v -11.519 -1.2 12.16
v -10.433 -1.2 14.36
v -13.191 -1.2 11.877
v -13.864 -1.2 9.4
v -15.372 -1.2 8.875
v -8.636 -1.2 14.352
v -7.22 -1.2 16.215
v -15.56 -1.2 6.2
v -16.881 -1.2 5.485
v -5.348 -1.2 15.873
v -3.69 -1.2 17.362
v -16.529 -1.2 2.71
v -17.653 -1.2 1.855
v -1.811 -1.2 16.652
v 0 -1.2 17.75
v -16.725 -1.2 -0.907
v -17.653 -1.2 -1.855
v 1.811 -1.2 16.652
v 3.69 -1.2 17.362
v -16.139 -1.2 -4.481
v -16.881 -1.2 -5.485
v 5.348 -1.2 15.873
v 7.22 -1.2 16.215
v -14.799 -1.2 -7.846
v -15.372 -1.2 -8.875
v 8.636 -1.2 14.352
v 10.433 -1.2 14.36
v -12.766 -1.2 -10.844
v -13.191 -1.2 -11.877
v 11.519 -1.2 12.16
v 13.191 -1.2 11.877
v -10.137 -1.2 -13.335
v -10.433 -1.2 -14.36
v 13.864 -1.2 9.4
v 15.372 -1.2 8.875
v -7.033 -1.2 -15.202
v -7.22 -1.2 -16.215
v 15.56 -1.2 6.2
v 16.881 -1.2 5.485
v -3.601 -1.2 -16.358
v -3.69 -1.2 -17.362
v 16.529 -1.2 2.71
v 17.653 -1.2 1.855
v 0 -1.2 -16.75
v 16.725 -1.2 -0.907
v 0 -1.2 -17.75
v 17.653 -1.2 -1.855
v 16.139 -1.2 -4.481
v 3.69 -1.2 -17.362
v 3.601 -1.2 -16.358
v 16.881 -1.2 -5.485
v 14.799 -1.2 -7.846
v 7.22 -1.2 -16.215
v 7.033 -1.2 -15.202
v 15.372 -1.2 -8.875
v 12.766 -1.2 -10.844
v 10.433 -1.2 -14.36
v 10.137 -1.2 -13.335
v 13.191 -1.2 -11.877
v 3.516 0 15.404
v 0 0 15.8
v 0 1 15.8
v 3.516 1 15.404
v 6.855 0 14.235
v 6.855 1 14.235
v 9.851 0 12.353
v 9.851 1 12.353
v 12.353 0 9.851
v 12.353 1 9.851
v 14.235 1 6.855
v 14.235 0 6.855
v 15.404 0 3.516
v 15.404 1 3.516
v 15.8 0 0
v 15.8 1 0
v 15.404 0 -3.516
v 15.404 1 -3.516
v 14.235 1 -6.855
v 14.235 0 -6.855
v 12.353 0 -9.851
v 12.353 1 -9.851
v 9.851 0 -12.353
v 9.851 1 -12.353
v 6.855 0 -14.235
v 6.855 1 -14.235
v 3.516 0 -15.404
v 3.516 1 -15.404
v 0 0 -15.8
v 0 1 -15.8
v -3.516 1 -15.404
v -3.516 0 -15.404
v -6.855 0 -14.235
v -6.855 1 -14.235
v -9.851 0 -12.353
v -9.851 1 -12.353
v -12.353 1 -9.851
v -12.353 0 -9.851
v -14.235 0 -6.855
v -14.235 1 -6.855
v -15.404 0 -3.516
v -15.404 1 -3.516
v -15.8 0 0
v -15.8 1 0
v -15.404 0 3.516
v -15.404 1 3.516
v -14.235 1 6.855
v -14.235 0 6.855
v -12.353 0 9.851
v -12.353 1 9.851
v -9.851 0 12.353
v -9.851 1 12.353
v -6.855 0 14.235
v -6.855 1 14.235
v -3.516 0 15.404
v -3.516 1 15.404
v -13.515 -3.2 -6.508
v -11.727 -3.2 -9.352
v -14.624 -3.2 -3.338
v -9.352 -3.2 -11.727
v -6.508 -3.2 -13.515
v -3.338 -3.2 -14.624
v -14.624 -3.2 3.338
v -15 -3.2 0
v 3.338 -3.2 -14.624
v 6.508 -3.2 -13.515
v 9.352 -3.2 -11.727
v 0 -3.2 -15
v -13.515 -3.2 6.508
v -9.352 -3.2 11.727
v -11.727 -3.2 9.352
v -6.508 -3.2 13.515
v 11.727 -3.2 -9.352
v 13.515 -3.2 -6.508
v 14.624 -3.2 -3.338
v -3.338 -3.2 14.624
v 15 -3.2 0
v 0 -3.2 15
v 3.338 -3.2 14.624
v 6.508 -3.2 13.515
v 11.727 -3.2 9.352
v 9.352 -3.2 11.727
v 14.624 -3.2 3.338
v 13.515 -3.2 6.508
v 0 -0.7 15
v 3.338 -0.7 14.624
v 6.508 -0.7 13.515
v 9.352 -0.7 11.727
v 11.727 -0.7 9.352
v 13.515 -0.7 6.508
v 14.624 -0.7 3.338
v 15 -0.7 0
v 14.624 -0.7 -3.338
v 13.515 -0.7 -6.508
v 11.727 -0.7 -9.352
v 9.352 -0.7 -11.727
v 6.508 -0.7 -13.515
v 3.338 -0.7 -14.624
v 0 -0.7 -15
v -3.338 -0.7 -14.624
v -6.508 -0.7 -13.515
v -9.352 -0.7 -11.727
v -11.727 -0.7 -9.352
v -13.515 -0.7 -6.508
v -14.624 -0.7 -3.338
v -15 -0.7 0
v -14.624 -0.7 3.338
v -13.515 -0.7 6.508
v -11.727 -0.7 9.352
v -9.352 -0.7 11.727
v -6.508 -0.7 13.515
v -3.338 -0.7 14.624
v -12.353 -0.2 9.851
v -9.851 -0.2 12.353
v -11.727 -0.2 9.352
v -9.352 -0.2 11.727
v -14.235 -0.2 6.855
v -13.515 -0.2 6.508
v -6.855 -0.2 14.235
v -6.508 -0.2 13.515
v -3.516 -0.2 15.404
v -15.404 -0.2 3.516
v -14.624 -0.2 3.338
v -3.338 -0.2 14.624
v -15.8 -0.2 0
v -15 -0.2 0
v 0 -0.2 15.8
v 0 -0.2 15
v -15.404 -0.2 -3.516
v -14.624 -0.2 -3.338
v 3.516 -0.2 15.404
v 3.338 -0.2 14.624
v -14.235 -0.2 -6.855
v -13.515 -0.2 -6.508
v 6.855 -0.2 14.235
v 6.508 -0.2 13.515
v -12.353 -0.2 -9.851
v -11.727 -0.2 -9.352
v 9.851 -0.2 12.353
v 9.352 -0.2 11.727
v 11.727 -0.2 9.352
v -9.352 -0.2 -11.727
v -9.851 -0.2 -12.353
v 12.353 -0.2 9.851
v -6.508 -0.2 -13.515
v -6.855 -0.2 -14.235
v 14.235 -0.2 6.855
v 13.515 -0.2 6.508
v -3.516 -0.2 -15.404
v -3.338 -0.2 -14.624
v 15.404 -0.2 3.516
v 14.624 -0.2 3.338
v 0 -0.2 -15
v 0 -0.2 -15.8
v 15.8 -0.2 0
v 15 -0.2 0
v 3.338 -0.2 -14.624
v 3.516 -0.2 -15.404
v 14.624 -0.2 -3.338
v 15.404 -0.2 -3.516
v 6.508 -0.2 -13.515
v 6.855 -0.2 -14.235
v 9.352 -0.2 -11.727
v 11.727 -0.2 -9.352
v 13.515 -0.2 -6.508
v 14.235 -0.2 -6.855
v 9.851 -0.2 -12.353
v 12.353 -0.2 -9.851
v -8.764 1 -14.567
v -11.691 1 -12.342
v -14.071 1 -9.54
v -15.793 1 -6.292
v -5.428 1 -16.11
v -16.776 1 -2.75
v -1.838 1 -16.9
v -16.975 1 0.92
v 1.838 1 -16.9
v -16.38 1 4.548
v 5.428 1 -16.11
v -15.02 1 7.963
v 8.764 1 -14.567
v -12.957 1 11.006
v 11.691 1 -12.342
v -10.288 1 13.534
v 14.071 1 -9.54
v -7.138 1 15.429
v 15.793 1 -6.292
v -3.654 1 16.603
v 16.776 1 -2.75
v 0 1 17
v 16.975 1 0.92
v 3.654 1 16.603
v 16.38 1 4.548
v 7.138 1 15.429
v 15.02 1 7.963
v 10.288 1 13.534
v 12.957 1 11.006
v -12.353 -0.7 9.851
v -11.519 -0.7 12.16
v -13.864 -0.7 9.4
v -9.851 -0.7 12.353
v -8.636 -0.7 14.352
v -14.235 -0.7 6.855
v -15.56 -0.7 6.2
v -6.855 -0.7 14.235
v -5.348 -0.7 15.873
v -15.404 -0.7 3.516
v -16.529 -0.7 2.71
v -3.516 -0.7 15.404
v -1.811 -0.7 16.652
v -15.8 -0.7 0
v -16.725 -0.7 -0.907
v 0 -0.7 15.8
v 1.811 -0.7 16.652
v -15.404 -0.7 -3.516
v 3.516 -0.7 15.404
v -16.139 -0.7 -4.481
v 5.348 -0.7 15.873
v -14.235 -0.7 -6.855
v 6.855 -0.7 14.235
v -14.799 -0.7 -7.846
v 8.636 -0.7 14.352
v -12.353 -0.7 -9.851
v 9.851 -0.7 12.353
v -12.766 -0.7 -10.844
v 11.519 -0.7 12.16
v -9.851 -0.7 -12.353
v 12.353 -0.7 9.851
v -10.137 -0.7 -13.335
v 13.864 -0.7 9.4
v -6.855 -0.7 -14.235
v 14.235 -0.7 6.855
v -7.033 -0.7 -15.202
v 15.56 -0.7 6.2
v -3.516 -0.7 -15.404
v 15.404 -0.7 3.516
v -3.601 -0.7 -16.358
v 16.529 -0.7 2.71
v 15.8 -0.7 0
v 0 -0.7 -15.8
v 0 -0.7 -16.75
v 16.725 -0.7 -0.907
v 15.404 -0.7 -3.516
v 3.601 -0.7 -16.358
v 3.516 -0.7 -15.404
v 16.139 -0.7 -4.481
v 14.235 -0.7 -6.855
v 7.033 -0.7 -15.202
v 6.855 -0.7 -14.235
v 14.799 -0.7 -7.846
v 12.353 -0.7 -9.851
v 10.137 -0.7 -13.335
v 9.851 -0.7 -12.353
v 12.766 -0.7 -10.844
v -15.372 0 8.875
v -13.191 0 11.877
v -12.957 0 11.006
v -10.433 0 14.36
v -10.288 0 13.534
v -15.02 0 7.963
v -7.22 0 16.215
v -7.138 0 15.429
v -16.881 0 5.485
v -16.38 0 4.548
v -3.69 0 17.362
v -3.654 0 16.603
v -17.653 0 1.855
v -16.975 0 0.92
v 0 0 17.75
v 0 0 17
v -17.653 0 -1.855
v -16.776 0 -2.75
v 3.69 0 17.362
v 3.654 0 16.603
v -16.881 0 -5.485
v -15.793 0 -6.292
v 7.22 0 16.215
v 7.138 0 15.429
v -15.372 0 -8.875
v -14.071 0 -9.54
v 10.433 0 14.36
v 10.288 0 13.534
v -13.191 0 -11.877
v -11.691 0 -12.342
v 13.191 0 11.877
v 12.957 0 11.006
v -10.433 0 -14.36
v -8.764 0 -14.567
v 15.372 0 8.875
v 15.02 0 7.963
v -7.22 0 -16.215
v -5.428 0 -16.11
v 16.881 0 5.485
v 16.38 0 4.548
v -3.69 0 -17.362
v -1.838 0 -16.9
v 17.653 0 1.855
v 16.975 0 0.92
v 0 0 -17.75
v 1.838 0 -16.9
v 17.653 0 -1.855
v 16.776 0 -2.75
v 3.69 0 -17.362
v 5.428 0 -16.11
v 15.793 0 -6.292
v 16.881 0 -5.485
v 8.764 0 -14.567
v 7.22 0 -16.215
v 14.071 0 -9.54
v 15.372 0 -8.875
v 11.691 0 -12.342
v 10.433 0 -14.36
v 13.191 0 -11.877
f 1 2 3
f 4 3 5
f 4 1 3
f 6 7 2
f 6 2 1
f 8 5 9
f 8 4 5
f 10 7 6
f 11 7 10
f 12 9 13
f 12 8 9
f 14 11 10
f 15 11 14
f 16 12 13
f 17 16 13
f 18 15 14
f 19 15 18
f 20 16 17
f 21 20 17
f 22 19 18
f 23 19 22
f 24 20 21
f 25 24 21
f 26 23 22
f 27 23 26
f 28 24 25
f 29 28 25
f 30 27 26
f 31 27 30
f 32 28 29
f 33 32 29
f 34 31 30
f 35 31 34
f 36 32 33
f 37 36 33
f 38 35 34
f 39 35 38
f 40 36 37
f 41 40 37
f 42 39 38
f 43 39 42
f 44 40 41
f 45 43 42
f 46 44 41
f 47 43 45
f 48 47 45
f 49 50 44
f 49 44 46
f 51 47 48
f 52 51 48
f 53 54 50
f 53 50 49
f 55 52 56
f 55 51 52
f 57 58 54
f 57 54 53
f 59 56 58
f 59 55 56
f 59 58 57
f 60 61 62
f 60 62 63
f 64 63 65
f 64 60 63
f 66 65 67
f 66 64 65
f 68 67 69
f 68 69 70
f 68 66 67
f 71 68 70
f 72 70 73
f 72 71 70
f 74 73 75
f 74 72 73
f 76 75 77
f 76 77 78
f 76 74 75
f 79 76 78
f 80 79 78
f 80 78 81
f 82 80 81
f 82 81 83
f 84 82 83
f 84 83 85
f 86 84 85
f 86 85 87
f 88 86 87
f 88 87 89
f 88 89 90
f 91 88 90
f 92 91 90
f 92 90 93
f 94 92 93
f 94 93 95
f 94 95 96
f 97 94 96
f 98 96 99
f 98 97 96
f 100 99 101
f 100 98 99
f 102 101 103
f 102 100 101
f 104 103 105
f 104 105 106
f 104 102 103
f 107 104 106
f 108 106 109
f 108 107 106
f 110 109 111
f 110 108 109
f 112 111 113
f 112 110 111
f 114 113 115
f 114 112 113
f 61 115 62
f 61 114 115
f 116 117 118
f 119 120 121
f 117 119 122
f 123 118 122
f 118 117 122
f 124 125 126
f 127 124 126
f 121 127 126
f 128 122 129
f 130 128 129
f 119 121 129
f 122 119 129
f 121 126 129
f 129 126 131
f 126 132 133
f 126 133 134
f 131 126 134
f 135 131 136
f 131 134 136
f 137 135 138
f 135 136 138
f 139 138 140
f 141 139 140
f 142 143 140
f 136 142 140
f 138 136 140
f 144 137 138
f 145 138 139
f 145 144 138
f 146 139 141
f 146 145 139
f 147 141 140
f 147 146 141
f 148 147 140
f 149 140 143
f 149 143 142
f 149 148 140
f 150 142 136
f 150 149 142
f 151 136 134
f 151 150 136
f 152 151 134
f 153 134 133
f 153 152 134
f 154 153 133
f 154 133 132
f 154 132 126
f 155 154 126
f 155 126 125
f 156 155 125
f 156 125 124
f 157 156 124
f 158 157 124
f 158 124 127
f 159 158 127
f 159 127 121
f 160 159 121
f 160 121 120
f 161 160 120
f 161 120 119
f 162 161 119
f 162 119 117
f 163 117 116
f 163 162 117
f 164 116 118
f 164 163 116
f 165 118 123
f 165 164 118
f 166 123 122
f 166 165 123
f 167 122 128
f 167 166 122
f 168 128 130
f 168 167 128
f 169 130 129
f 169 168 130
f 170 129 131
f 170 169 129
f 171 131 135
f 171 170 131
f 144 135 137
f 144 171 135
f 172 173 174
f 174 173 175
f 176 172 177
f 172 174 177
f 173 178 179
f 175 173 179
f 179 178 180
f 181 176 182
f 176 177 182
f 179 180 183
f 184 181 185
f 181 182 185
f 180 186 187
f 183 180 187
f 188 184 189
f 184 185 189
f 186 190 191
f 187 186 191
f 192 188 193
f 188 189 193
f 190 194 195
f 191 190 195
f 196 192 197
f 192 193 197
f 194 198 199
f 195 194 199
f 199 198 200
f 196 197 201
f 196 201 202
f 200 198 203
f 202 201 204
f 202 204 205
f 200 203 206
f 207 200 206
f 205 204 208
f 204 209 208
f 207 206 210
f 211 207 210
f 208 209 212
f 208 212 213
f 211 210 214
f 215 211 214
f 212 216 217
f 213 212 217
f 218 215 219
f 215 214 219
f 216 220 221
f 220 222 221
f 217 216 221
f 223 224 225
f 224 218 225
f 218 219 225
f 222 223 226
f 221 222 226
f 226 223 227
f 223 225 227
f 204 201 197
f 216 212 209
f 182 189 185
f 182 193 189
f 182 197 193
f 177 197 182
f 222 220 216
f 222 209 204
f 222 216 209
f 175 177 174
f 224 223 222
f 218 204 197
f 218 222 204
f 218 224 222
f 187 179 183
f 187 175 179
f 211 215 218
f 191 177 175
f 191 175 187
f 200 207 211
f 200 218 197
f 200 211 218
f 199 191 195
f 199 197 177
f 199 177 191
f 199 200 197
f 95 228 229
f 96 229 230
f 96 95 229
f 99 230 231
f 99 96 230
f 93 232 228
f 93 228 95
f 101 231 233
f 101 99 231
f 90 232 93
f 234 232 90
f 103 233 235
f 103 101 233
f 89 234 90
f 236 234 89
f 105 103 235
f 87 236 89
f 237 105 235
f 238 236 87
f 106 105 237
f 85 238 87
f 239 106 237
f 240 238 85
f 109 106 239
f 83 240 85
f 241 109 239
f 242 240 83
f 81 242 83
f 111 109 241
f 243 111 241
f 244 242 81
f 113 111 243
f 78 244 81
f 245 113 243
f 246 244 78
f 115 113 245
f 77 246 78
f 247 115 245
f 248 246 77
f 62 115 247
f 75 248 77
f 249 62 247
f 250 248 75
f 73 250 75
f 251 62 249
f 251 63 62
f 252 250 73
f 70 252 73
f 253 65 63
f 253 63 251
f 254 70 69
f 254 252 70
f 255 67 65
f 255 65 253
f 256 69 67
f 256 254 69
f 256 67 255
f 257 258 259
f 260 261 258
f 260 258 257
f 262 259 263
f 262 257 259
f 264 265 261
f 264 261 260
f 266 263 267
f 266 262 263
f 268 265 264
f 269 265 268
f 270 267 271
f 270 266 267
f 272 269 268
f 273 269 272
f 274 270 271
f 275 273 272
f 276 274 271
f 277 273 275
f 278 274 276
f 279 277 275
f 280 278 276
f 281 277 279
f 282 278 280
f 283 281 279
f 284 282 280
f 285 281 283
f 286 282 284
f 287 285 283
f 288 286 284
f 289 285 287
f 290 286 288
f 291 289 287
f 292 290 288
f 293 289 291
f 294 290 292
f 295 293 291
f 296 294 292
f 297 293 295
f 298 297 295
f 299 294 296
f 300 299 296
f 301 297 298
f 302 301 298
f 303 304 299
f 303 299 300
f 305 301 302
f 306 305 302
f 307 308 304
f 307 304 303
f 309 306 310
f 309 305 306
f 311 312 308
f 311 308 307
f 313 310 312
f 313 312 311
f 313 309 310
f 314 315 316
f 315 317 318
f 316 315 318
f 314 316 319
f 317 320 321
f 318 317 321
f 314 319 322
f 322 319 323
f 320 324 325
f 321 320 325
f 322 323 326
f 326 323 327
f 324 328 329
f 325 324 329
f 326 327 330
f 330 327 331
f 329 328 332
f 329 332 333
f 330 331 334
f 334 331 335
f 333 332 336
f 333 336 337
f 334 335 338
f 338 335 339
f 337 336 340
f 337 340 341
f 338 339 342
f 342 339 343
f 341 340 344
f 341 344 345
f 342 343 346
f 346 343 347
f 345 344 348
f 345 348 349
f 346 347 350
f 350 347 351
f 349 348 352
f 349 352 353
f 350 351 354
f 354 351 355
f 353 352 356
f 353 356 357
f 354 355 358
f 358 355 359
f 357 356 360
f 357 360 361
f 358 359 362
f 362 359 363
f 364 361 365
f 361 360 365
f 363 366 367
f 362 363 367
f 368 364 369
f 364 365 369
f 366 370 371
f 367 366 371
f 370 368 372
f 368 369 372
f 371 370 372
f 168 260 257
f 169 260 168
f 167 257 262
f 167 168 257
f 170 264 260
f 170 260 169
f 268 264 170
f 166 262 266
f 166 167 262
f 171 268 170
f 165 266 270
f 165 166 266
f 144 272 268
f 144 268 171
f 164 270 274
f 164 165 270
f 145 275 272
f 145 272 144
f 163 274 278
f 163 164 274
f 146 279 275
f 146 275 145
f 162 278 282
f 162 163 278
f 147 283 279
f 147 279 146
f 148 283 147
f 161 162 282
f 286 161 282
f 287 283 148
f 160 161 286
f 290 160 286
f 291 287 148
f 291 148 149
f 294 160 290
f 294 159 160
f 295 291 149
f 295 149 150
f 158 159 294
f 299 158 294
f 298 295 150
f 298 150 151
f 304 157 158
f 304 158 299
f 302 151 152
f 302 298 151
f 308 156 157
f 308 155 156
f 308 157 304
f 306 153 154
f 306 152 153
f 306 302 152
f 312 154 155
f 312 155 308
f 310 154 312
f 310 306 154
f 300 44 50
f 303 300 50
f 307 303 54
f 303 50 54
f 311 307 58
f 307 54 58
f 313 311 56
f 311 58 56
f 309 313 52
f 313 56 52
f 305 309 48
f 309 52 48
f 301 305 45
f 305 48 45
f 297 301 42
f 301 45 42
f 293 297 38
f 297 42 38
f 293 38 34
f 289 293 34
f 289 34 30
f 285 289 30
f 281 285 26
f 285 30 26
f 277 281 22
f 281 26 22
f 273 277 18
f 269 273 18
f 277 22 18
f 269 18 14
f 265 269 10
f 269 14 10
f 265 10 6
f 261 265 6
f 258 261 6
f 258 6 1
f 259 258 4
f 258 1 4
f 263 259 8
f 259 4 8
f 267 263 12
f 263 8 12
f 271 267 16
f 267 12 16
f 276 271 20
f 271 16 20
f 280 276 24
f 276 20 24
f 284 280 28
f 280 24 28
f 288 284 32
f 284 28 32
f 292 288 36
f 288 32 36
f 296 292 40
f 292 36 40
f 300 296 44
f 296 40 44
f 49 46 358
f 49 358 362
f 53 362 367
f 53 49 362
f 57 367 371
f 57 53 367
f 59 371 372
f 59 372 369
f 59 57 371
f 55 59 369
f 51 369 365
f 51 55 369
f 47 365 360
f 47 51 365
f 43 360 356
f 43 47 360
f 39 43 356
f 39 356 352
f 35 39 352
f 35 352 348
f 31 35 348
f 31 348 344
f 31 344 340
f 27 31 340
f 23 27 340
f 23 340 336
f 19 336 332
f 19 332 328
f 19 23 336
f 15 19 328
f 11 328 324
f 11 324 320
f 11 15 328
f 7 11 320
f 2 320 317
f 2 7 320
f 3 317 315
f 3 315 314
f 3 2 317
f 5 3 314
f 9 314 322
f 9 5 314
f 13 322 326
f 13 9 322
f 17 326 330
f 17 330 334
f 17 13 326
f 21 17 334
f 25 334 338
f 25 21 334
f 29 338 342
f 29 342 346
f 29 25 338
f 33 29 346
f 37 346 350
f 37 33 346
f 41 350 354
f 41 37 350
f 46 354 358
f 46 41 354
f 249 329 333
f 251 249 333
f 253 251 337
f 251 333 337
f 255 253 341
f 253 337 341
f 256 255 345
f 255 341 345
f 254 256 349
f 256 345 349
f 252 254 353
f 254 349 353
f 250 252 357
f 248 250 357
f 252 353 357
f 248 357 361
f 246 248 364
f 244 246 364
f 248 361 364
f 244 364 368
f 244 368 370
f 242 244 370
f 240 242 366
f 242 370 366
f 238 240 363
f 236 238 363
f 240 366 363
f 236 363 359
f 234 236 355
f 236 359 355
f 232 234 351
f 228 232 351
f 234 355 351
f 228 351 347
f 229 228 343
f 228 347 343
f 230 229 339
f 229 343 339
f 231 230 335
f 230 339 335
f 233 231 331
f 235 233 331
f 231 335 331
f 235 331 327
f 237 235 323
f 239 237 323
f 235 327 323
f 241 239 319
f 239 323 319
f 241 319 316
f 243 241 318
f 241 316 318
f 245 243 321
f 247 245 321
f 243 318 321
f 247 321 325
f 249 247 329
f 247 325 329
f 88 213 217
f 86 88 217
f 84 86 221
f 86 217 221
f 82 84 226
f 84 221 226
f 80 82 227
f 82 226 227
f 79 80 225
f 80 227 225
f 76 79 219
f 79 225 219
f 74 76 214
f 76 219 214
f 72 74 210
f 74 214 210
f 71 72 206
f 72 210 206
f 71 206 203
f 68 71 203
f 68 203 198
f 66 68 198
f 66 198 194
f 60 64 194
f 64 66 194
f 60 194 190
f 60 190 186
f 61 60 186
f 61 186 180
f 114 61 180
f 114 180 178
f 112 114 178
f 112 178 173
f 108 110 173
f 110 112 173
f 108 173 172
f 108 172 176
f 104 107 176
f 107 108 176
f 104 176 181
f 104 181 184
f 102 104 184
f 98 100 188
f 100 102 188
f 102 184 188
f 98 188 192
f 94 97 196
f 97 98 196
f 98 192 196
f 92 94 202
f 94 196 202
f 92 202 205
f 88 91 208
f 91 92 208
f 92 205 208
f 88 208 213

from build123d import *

# Parameters (mm, degrees)
SKETCH_1_R          = 17
SKETCH_1_R_2        = 15.8
EXTRUDE_1_DEPTH     = 1
EXTRUDE_START       = 1.2
SKETCH_2_R          = 17.75
SKETCH_2_R_2        = 15.8
EXTRUDE_2_DEPTH     = 1.2
SKETCH_3_R          = 16.75
SKETCH_3_R_2        = 15.8
CUT_EXTRUDE_1_DEPTH = 0.5
SKETCH_4_R          = 15.8
SKETCH_4_R_2        = 15
EXTRUDE_3_DEPTH     = 0.5
SKETCH_6_R          = 15
EXTRUDE_4_DEPTH     = 3


with BuildPart() as part:
    # 草图1 → 凸台-拉伸1 (new body)
    with BuildSketch(Plane(origin=(0, 0, 0), x_dir=(1, 0, 0), z_dir=(0, 1, 0))):
        Circle(SKETCH_1_R)
        Circle(SKETCH_1_R_2, mode=Mode.SUBTRACT)
    extrude(amount=EXTRUDE_1_DEPTH)

    # 草图2 → 凸台-拉伸2 (add)
    with BuildSketch(Plane.XZ.offset(EXTRUDE_START)):
        Circle(SKETCH_2_R)
        Circle(SKETCH_2_R_2, mode=Mode.SUBTRACT)
    extrude(amount=-EXTRUDE_2_DEPTH)

    # 草图3 → 切除-拉伸1 (cut)
    with BuildSketch(Plane(origin=(0, -1.2, 0), x_dir=(-1, 0, 0), z_dir=(0, -1, 0))):
        Circle(SKETCH_3_R)
        Circle(SKETCH_3_R_2, mode=Mode.SUBTRACT)
    extrude(amount=-CUT_EXTRUDE_1_DEPTH, mode=Mode.SUBTRACT)



with BuildPart() as body_2:
    # 草图4 → 凸台-拉伸3 (new body)
    with BuildSketch(Plane.XZ.offset(0.7)):
        Circle(SKETCH_4_R)
        Circle(SKETCH_4_R_2, mode=Mode.SUBTRACT)
    extrude(amount=-EXTRUDE_3_DEPTH)


with BuildPart() as part_1:
    add(part.part)

    add(body_2.part)  # 凸台-拉伸4 merges body 2
    # 草图6 → 凸台-拉伸4 (add)
    with BuildSketch(Plane(origin=(0, -0.2, 0), x_dir=(1, 0, 0), z_dir=(0, 1, 0))):
        Circle(SKETCH_6_R)
    extrude(amount=-EXTRUDE_4_DEPTH)


solid = part_1.part
